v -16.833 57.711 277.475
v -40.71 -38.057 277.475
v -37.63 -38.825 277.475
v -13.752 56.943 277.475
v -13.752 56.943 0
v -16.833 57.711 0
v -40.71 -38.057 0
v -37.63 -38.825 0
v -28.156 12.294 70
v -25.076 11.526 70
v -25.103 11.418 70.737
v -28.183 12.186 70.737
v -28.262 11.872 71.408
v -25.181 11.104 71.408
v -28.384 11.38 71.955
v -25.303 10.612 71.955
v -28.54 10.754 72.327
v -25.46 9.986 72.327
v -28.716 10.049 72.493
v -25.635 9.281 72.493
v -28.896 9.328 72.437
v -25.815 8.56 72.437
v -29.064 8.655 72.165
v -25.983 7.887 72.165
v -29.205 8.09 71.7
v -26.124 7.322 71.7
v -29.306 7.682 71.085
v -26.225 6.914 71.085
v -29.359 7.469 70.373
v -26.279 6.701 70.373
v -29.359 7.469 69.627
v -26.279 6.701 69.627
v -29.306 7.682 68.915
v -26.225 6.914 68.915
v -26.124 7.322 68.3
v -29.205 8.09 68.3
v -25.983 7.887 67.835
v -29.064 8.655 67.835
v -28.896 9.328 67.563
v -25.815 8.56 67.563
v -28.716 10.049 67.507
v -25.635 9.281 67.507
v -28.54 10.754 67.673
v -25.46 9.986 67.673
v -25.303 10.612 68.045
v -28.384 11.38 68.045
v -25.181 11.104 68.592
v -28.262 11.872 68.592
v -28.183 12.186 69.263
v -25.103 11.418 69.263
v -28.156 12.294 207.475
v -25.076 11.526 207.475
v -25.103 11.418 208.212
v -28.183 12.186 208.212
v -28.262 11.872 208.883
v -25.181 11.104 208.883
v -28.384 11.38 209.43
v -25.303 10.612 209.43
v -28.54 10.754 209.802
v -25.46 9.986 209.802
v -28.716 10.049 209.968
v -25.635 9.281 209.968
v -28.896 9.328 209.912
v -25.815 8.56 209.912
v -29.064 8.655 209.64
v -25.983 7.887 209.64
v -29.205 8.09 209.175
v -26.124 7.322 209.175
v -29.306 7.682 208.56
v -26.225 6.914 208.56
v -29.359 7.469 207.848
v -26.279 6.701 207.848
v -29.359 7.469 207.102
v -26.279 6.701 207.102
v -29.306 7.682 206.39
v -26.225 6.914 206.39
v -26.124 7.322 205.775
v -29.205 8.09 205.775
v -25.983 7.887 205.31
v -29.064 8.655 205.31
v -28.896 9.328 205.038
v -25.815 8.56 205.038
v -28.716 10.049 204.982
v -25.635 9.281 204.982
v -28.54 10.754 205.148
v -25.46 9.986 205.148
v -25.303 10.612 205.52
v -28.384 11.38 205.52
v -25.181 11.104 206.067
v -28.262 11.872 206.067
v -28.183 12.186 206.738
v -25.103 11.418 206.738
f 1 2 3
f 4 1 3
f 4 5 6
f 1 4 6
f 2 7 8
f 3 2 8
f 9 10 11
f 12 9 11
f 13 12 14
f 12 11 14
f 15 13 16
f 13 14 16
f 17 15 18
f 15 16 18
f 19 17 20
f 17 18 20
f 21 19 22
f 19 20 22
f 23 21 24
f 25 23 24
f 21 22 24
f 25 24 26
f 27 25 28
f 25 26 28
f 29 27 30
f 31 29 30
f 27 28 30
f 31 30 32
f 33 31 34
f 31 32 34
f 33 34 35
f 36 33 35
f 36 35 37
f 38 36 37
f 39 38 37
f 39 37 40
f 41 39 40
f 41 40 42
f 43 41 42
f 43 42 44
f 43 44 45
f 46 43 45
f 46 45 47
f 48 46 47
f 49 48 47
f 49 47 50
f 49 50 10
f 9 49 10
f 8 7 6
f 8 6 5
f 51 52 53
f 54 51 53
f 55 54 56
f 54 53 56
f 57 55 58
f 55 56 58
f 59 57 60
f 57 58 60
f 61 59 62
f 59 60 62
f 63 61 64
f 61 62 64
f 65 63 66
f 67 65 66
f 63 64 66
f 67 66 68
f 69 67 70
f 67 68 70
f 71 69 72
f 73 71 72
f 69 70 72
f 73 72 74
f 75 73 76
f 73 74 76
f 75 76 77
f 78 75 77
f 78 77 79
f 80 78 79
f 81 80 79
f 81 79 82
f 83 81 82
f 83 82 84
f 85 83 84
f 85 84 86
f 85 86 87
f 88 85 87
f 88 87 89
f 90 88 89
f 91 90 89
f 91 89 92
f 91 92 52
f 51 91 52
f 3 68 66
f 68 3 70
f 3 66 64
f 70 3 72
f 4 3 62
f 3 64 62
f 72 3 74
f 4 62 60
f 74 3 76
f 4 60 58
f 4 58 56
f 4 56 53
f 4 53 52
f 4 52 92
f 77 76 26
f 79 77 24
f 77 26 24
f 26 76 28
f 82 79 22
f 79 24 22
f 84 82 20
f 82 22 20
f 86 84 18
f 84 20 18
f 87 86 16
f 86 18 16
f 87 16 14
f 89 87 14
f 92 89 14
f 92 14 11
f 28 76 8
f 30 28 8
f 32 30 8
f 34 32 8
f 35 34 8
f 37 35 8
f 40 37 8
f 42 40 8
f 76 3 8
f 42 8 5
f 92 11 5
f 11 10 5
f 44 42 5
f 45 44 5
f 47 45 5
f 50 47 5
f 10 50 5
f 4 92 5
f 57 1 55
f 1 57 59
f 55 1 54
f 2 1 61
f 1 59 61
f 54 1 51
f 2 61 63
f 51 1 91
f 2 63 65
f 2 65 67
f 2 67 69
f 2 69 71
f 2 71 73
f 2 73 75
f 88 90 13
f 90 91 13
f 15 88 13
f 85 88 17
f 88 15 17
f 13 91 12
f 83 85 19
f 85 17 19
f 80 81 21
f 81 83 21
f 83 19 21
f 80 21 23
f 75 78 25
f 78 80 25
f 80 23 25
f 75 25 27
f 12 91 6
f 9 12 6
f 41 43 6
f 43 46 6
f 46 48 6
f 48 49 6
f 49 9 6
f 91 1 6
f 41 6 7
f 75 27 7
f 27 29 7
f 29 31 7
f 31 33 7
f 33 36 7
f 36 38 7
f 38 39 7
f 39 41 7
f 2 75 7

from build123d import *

# Parameters (mm, degrees)
BOSS_EXTRUDE1_DEPTH = 277.475
CUT_EXTRUDE1_REACH  = 284.517
SKETCH2_R           = 2.5


with BuildPart() as part:
    # Sketch1 → Boss-Extrude1 (new body)
    with BuildSketch(Plane.XY):
        Polygon((-37.629508919, -38.824877845), (-13.751817824, 56.943310339), (-16.832506755, 57.711412357), (-40.71019785, -38.056775826), align=None)
    extrude(amount=BOSS_EXTRUDE1_DEPTH)

    # Sketch2 → Cut-Extrude1 (cut, up to next)
    with BuildSketch(Plane(origin=(-26.313608582, 6.560719475, 0), x_dir=(0, 0, -1), z_dir=(0.9702957262759973, -0.24192189559966462, 0)), mode=Mode.PRIVATE) as cut_extrude1_sk1:
        with Locations(Location((-207.475, 2.616835031, 0), (0, 0, 90))):
            Circle(SKETCH2_R)
    cut_extrude1_tool1 = extrude(cut_extrude1_sk1.sketch, amount=-CUT_EXTRUDE1_REACH, mode=Mode.PRIVATE) & part.part
    # Sketch2 → Cut-Extrude1 (cut, up to next)
    with BuildSketch(Plane(origin=(-26.313608582, 6.560719475, 0), x_dir=(0, 0, -1), z_dir=(0.9702957262759973, -0.24192189559966462, 0)), mode=Mode.PRIVATE) as cut_extrude1_sk2:
        with Locations(Location((-70, 2.616835031, 0), (0, 0, 90))):
            Circle(SKETCH2_R)
    cut_extrude1_tool2 = extrude(cut_extrude1_sk2.sketch, amount=-CUT_EXTRUDE1_REACH, mode=Mode.PRIVATE) & part.part
    add(cut_extrude1_tool1.solids().sort_by_distance((-25.680539, 9.099823, 207.475))[0], mode=Mode.SUBTRACT)
    add(cut_extrude1_tool2.solids().sort_by_distance((-25.680539, 9.099823, 70))[0], mode=Mode.SUBTRACT)


solid = part.part
